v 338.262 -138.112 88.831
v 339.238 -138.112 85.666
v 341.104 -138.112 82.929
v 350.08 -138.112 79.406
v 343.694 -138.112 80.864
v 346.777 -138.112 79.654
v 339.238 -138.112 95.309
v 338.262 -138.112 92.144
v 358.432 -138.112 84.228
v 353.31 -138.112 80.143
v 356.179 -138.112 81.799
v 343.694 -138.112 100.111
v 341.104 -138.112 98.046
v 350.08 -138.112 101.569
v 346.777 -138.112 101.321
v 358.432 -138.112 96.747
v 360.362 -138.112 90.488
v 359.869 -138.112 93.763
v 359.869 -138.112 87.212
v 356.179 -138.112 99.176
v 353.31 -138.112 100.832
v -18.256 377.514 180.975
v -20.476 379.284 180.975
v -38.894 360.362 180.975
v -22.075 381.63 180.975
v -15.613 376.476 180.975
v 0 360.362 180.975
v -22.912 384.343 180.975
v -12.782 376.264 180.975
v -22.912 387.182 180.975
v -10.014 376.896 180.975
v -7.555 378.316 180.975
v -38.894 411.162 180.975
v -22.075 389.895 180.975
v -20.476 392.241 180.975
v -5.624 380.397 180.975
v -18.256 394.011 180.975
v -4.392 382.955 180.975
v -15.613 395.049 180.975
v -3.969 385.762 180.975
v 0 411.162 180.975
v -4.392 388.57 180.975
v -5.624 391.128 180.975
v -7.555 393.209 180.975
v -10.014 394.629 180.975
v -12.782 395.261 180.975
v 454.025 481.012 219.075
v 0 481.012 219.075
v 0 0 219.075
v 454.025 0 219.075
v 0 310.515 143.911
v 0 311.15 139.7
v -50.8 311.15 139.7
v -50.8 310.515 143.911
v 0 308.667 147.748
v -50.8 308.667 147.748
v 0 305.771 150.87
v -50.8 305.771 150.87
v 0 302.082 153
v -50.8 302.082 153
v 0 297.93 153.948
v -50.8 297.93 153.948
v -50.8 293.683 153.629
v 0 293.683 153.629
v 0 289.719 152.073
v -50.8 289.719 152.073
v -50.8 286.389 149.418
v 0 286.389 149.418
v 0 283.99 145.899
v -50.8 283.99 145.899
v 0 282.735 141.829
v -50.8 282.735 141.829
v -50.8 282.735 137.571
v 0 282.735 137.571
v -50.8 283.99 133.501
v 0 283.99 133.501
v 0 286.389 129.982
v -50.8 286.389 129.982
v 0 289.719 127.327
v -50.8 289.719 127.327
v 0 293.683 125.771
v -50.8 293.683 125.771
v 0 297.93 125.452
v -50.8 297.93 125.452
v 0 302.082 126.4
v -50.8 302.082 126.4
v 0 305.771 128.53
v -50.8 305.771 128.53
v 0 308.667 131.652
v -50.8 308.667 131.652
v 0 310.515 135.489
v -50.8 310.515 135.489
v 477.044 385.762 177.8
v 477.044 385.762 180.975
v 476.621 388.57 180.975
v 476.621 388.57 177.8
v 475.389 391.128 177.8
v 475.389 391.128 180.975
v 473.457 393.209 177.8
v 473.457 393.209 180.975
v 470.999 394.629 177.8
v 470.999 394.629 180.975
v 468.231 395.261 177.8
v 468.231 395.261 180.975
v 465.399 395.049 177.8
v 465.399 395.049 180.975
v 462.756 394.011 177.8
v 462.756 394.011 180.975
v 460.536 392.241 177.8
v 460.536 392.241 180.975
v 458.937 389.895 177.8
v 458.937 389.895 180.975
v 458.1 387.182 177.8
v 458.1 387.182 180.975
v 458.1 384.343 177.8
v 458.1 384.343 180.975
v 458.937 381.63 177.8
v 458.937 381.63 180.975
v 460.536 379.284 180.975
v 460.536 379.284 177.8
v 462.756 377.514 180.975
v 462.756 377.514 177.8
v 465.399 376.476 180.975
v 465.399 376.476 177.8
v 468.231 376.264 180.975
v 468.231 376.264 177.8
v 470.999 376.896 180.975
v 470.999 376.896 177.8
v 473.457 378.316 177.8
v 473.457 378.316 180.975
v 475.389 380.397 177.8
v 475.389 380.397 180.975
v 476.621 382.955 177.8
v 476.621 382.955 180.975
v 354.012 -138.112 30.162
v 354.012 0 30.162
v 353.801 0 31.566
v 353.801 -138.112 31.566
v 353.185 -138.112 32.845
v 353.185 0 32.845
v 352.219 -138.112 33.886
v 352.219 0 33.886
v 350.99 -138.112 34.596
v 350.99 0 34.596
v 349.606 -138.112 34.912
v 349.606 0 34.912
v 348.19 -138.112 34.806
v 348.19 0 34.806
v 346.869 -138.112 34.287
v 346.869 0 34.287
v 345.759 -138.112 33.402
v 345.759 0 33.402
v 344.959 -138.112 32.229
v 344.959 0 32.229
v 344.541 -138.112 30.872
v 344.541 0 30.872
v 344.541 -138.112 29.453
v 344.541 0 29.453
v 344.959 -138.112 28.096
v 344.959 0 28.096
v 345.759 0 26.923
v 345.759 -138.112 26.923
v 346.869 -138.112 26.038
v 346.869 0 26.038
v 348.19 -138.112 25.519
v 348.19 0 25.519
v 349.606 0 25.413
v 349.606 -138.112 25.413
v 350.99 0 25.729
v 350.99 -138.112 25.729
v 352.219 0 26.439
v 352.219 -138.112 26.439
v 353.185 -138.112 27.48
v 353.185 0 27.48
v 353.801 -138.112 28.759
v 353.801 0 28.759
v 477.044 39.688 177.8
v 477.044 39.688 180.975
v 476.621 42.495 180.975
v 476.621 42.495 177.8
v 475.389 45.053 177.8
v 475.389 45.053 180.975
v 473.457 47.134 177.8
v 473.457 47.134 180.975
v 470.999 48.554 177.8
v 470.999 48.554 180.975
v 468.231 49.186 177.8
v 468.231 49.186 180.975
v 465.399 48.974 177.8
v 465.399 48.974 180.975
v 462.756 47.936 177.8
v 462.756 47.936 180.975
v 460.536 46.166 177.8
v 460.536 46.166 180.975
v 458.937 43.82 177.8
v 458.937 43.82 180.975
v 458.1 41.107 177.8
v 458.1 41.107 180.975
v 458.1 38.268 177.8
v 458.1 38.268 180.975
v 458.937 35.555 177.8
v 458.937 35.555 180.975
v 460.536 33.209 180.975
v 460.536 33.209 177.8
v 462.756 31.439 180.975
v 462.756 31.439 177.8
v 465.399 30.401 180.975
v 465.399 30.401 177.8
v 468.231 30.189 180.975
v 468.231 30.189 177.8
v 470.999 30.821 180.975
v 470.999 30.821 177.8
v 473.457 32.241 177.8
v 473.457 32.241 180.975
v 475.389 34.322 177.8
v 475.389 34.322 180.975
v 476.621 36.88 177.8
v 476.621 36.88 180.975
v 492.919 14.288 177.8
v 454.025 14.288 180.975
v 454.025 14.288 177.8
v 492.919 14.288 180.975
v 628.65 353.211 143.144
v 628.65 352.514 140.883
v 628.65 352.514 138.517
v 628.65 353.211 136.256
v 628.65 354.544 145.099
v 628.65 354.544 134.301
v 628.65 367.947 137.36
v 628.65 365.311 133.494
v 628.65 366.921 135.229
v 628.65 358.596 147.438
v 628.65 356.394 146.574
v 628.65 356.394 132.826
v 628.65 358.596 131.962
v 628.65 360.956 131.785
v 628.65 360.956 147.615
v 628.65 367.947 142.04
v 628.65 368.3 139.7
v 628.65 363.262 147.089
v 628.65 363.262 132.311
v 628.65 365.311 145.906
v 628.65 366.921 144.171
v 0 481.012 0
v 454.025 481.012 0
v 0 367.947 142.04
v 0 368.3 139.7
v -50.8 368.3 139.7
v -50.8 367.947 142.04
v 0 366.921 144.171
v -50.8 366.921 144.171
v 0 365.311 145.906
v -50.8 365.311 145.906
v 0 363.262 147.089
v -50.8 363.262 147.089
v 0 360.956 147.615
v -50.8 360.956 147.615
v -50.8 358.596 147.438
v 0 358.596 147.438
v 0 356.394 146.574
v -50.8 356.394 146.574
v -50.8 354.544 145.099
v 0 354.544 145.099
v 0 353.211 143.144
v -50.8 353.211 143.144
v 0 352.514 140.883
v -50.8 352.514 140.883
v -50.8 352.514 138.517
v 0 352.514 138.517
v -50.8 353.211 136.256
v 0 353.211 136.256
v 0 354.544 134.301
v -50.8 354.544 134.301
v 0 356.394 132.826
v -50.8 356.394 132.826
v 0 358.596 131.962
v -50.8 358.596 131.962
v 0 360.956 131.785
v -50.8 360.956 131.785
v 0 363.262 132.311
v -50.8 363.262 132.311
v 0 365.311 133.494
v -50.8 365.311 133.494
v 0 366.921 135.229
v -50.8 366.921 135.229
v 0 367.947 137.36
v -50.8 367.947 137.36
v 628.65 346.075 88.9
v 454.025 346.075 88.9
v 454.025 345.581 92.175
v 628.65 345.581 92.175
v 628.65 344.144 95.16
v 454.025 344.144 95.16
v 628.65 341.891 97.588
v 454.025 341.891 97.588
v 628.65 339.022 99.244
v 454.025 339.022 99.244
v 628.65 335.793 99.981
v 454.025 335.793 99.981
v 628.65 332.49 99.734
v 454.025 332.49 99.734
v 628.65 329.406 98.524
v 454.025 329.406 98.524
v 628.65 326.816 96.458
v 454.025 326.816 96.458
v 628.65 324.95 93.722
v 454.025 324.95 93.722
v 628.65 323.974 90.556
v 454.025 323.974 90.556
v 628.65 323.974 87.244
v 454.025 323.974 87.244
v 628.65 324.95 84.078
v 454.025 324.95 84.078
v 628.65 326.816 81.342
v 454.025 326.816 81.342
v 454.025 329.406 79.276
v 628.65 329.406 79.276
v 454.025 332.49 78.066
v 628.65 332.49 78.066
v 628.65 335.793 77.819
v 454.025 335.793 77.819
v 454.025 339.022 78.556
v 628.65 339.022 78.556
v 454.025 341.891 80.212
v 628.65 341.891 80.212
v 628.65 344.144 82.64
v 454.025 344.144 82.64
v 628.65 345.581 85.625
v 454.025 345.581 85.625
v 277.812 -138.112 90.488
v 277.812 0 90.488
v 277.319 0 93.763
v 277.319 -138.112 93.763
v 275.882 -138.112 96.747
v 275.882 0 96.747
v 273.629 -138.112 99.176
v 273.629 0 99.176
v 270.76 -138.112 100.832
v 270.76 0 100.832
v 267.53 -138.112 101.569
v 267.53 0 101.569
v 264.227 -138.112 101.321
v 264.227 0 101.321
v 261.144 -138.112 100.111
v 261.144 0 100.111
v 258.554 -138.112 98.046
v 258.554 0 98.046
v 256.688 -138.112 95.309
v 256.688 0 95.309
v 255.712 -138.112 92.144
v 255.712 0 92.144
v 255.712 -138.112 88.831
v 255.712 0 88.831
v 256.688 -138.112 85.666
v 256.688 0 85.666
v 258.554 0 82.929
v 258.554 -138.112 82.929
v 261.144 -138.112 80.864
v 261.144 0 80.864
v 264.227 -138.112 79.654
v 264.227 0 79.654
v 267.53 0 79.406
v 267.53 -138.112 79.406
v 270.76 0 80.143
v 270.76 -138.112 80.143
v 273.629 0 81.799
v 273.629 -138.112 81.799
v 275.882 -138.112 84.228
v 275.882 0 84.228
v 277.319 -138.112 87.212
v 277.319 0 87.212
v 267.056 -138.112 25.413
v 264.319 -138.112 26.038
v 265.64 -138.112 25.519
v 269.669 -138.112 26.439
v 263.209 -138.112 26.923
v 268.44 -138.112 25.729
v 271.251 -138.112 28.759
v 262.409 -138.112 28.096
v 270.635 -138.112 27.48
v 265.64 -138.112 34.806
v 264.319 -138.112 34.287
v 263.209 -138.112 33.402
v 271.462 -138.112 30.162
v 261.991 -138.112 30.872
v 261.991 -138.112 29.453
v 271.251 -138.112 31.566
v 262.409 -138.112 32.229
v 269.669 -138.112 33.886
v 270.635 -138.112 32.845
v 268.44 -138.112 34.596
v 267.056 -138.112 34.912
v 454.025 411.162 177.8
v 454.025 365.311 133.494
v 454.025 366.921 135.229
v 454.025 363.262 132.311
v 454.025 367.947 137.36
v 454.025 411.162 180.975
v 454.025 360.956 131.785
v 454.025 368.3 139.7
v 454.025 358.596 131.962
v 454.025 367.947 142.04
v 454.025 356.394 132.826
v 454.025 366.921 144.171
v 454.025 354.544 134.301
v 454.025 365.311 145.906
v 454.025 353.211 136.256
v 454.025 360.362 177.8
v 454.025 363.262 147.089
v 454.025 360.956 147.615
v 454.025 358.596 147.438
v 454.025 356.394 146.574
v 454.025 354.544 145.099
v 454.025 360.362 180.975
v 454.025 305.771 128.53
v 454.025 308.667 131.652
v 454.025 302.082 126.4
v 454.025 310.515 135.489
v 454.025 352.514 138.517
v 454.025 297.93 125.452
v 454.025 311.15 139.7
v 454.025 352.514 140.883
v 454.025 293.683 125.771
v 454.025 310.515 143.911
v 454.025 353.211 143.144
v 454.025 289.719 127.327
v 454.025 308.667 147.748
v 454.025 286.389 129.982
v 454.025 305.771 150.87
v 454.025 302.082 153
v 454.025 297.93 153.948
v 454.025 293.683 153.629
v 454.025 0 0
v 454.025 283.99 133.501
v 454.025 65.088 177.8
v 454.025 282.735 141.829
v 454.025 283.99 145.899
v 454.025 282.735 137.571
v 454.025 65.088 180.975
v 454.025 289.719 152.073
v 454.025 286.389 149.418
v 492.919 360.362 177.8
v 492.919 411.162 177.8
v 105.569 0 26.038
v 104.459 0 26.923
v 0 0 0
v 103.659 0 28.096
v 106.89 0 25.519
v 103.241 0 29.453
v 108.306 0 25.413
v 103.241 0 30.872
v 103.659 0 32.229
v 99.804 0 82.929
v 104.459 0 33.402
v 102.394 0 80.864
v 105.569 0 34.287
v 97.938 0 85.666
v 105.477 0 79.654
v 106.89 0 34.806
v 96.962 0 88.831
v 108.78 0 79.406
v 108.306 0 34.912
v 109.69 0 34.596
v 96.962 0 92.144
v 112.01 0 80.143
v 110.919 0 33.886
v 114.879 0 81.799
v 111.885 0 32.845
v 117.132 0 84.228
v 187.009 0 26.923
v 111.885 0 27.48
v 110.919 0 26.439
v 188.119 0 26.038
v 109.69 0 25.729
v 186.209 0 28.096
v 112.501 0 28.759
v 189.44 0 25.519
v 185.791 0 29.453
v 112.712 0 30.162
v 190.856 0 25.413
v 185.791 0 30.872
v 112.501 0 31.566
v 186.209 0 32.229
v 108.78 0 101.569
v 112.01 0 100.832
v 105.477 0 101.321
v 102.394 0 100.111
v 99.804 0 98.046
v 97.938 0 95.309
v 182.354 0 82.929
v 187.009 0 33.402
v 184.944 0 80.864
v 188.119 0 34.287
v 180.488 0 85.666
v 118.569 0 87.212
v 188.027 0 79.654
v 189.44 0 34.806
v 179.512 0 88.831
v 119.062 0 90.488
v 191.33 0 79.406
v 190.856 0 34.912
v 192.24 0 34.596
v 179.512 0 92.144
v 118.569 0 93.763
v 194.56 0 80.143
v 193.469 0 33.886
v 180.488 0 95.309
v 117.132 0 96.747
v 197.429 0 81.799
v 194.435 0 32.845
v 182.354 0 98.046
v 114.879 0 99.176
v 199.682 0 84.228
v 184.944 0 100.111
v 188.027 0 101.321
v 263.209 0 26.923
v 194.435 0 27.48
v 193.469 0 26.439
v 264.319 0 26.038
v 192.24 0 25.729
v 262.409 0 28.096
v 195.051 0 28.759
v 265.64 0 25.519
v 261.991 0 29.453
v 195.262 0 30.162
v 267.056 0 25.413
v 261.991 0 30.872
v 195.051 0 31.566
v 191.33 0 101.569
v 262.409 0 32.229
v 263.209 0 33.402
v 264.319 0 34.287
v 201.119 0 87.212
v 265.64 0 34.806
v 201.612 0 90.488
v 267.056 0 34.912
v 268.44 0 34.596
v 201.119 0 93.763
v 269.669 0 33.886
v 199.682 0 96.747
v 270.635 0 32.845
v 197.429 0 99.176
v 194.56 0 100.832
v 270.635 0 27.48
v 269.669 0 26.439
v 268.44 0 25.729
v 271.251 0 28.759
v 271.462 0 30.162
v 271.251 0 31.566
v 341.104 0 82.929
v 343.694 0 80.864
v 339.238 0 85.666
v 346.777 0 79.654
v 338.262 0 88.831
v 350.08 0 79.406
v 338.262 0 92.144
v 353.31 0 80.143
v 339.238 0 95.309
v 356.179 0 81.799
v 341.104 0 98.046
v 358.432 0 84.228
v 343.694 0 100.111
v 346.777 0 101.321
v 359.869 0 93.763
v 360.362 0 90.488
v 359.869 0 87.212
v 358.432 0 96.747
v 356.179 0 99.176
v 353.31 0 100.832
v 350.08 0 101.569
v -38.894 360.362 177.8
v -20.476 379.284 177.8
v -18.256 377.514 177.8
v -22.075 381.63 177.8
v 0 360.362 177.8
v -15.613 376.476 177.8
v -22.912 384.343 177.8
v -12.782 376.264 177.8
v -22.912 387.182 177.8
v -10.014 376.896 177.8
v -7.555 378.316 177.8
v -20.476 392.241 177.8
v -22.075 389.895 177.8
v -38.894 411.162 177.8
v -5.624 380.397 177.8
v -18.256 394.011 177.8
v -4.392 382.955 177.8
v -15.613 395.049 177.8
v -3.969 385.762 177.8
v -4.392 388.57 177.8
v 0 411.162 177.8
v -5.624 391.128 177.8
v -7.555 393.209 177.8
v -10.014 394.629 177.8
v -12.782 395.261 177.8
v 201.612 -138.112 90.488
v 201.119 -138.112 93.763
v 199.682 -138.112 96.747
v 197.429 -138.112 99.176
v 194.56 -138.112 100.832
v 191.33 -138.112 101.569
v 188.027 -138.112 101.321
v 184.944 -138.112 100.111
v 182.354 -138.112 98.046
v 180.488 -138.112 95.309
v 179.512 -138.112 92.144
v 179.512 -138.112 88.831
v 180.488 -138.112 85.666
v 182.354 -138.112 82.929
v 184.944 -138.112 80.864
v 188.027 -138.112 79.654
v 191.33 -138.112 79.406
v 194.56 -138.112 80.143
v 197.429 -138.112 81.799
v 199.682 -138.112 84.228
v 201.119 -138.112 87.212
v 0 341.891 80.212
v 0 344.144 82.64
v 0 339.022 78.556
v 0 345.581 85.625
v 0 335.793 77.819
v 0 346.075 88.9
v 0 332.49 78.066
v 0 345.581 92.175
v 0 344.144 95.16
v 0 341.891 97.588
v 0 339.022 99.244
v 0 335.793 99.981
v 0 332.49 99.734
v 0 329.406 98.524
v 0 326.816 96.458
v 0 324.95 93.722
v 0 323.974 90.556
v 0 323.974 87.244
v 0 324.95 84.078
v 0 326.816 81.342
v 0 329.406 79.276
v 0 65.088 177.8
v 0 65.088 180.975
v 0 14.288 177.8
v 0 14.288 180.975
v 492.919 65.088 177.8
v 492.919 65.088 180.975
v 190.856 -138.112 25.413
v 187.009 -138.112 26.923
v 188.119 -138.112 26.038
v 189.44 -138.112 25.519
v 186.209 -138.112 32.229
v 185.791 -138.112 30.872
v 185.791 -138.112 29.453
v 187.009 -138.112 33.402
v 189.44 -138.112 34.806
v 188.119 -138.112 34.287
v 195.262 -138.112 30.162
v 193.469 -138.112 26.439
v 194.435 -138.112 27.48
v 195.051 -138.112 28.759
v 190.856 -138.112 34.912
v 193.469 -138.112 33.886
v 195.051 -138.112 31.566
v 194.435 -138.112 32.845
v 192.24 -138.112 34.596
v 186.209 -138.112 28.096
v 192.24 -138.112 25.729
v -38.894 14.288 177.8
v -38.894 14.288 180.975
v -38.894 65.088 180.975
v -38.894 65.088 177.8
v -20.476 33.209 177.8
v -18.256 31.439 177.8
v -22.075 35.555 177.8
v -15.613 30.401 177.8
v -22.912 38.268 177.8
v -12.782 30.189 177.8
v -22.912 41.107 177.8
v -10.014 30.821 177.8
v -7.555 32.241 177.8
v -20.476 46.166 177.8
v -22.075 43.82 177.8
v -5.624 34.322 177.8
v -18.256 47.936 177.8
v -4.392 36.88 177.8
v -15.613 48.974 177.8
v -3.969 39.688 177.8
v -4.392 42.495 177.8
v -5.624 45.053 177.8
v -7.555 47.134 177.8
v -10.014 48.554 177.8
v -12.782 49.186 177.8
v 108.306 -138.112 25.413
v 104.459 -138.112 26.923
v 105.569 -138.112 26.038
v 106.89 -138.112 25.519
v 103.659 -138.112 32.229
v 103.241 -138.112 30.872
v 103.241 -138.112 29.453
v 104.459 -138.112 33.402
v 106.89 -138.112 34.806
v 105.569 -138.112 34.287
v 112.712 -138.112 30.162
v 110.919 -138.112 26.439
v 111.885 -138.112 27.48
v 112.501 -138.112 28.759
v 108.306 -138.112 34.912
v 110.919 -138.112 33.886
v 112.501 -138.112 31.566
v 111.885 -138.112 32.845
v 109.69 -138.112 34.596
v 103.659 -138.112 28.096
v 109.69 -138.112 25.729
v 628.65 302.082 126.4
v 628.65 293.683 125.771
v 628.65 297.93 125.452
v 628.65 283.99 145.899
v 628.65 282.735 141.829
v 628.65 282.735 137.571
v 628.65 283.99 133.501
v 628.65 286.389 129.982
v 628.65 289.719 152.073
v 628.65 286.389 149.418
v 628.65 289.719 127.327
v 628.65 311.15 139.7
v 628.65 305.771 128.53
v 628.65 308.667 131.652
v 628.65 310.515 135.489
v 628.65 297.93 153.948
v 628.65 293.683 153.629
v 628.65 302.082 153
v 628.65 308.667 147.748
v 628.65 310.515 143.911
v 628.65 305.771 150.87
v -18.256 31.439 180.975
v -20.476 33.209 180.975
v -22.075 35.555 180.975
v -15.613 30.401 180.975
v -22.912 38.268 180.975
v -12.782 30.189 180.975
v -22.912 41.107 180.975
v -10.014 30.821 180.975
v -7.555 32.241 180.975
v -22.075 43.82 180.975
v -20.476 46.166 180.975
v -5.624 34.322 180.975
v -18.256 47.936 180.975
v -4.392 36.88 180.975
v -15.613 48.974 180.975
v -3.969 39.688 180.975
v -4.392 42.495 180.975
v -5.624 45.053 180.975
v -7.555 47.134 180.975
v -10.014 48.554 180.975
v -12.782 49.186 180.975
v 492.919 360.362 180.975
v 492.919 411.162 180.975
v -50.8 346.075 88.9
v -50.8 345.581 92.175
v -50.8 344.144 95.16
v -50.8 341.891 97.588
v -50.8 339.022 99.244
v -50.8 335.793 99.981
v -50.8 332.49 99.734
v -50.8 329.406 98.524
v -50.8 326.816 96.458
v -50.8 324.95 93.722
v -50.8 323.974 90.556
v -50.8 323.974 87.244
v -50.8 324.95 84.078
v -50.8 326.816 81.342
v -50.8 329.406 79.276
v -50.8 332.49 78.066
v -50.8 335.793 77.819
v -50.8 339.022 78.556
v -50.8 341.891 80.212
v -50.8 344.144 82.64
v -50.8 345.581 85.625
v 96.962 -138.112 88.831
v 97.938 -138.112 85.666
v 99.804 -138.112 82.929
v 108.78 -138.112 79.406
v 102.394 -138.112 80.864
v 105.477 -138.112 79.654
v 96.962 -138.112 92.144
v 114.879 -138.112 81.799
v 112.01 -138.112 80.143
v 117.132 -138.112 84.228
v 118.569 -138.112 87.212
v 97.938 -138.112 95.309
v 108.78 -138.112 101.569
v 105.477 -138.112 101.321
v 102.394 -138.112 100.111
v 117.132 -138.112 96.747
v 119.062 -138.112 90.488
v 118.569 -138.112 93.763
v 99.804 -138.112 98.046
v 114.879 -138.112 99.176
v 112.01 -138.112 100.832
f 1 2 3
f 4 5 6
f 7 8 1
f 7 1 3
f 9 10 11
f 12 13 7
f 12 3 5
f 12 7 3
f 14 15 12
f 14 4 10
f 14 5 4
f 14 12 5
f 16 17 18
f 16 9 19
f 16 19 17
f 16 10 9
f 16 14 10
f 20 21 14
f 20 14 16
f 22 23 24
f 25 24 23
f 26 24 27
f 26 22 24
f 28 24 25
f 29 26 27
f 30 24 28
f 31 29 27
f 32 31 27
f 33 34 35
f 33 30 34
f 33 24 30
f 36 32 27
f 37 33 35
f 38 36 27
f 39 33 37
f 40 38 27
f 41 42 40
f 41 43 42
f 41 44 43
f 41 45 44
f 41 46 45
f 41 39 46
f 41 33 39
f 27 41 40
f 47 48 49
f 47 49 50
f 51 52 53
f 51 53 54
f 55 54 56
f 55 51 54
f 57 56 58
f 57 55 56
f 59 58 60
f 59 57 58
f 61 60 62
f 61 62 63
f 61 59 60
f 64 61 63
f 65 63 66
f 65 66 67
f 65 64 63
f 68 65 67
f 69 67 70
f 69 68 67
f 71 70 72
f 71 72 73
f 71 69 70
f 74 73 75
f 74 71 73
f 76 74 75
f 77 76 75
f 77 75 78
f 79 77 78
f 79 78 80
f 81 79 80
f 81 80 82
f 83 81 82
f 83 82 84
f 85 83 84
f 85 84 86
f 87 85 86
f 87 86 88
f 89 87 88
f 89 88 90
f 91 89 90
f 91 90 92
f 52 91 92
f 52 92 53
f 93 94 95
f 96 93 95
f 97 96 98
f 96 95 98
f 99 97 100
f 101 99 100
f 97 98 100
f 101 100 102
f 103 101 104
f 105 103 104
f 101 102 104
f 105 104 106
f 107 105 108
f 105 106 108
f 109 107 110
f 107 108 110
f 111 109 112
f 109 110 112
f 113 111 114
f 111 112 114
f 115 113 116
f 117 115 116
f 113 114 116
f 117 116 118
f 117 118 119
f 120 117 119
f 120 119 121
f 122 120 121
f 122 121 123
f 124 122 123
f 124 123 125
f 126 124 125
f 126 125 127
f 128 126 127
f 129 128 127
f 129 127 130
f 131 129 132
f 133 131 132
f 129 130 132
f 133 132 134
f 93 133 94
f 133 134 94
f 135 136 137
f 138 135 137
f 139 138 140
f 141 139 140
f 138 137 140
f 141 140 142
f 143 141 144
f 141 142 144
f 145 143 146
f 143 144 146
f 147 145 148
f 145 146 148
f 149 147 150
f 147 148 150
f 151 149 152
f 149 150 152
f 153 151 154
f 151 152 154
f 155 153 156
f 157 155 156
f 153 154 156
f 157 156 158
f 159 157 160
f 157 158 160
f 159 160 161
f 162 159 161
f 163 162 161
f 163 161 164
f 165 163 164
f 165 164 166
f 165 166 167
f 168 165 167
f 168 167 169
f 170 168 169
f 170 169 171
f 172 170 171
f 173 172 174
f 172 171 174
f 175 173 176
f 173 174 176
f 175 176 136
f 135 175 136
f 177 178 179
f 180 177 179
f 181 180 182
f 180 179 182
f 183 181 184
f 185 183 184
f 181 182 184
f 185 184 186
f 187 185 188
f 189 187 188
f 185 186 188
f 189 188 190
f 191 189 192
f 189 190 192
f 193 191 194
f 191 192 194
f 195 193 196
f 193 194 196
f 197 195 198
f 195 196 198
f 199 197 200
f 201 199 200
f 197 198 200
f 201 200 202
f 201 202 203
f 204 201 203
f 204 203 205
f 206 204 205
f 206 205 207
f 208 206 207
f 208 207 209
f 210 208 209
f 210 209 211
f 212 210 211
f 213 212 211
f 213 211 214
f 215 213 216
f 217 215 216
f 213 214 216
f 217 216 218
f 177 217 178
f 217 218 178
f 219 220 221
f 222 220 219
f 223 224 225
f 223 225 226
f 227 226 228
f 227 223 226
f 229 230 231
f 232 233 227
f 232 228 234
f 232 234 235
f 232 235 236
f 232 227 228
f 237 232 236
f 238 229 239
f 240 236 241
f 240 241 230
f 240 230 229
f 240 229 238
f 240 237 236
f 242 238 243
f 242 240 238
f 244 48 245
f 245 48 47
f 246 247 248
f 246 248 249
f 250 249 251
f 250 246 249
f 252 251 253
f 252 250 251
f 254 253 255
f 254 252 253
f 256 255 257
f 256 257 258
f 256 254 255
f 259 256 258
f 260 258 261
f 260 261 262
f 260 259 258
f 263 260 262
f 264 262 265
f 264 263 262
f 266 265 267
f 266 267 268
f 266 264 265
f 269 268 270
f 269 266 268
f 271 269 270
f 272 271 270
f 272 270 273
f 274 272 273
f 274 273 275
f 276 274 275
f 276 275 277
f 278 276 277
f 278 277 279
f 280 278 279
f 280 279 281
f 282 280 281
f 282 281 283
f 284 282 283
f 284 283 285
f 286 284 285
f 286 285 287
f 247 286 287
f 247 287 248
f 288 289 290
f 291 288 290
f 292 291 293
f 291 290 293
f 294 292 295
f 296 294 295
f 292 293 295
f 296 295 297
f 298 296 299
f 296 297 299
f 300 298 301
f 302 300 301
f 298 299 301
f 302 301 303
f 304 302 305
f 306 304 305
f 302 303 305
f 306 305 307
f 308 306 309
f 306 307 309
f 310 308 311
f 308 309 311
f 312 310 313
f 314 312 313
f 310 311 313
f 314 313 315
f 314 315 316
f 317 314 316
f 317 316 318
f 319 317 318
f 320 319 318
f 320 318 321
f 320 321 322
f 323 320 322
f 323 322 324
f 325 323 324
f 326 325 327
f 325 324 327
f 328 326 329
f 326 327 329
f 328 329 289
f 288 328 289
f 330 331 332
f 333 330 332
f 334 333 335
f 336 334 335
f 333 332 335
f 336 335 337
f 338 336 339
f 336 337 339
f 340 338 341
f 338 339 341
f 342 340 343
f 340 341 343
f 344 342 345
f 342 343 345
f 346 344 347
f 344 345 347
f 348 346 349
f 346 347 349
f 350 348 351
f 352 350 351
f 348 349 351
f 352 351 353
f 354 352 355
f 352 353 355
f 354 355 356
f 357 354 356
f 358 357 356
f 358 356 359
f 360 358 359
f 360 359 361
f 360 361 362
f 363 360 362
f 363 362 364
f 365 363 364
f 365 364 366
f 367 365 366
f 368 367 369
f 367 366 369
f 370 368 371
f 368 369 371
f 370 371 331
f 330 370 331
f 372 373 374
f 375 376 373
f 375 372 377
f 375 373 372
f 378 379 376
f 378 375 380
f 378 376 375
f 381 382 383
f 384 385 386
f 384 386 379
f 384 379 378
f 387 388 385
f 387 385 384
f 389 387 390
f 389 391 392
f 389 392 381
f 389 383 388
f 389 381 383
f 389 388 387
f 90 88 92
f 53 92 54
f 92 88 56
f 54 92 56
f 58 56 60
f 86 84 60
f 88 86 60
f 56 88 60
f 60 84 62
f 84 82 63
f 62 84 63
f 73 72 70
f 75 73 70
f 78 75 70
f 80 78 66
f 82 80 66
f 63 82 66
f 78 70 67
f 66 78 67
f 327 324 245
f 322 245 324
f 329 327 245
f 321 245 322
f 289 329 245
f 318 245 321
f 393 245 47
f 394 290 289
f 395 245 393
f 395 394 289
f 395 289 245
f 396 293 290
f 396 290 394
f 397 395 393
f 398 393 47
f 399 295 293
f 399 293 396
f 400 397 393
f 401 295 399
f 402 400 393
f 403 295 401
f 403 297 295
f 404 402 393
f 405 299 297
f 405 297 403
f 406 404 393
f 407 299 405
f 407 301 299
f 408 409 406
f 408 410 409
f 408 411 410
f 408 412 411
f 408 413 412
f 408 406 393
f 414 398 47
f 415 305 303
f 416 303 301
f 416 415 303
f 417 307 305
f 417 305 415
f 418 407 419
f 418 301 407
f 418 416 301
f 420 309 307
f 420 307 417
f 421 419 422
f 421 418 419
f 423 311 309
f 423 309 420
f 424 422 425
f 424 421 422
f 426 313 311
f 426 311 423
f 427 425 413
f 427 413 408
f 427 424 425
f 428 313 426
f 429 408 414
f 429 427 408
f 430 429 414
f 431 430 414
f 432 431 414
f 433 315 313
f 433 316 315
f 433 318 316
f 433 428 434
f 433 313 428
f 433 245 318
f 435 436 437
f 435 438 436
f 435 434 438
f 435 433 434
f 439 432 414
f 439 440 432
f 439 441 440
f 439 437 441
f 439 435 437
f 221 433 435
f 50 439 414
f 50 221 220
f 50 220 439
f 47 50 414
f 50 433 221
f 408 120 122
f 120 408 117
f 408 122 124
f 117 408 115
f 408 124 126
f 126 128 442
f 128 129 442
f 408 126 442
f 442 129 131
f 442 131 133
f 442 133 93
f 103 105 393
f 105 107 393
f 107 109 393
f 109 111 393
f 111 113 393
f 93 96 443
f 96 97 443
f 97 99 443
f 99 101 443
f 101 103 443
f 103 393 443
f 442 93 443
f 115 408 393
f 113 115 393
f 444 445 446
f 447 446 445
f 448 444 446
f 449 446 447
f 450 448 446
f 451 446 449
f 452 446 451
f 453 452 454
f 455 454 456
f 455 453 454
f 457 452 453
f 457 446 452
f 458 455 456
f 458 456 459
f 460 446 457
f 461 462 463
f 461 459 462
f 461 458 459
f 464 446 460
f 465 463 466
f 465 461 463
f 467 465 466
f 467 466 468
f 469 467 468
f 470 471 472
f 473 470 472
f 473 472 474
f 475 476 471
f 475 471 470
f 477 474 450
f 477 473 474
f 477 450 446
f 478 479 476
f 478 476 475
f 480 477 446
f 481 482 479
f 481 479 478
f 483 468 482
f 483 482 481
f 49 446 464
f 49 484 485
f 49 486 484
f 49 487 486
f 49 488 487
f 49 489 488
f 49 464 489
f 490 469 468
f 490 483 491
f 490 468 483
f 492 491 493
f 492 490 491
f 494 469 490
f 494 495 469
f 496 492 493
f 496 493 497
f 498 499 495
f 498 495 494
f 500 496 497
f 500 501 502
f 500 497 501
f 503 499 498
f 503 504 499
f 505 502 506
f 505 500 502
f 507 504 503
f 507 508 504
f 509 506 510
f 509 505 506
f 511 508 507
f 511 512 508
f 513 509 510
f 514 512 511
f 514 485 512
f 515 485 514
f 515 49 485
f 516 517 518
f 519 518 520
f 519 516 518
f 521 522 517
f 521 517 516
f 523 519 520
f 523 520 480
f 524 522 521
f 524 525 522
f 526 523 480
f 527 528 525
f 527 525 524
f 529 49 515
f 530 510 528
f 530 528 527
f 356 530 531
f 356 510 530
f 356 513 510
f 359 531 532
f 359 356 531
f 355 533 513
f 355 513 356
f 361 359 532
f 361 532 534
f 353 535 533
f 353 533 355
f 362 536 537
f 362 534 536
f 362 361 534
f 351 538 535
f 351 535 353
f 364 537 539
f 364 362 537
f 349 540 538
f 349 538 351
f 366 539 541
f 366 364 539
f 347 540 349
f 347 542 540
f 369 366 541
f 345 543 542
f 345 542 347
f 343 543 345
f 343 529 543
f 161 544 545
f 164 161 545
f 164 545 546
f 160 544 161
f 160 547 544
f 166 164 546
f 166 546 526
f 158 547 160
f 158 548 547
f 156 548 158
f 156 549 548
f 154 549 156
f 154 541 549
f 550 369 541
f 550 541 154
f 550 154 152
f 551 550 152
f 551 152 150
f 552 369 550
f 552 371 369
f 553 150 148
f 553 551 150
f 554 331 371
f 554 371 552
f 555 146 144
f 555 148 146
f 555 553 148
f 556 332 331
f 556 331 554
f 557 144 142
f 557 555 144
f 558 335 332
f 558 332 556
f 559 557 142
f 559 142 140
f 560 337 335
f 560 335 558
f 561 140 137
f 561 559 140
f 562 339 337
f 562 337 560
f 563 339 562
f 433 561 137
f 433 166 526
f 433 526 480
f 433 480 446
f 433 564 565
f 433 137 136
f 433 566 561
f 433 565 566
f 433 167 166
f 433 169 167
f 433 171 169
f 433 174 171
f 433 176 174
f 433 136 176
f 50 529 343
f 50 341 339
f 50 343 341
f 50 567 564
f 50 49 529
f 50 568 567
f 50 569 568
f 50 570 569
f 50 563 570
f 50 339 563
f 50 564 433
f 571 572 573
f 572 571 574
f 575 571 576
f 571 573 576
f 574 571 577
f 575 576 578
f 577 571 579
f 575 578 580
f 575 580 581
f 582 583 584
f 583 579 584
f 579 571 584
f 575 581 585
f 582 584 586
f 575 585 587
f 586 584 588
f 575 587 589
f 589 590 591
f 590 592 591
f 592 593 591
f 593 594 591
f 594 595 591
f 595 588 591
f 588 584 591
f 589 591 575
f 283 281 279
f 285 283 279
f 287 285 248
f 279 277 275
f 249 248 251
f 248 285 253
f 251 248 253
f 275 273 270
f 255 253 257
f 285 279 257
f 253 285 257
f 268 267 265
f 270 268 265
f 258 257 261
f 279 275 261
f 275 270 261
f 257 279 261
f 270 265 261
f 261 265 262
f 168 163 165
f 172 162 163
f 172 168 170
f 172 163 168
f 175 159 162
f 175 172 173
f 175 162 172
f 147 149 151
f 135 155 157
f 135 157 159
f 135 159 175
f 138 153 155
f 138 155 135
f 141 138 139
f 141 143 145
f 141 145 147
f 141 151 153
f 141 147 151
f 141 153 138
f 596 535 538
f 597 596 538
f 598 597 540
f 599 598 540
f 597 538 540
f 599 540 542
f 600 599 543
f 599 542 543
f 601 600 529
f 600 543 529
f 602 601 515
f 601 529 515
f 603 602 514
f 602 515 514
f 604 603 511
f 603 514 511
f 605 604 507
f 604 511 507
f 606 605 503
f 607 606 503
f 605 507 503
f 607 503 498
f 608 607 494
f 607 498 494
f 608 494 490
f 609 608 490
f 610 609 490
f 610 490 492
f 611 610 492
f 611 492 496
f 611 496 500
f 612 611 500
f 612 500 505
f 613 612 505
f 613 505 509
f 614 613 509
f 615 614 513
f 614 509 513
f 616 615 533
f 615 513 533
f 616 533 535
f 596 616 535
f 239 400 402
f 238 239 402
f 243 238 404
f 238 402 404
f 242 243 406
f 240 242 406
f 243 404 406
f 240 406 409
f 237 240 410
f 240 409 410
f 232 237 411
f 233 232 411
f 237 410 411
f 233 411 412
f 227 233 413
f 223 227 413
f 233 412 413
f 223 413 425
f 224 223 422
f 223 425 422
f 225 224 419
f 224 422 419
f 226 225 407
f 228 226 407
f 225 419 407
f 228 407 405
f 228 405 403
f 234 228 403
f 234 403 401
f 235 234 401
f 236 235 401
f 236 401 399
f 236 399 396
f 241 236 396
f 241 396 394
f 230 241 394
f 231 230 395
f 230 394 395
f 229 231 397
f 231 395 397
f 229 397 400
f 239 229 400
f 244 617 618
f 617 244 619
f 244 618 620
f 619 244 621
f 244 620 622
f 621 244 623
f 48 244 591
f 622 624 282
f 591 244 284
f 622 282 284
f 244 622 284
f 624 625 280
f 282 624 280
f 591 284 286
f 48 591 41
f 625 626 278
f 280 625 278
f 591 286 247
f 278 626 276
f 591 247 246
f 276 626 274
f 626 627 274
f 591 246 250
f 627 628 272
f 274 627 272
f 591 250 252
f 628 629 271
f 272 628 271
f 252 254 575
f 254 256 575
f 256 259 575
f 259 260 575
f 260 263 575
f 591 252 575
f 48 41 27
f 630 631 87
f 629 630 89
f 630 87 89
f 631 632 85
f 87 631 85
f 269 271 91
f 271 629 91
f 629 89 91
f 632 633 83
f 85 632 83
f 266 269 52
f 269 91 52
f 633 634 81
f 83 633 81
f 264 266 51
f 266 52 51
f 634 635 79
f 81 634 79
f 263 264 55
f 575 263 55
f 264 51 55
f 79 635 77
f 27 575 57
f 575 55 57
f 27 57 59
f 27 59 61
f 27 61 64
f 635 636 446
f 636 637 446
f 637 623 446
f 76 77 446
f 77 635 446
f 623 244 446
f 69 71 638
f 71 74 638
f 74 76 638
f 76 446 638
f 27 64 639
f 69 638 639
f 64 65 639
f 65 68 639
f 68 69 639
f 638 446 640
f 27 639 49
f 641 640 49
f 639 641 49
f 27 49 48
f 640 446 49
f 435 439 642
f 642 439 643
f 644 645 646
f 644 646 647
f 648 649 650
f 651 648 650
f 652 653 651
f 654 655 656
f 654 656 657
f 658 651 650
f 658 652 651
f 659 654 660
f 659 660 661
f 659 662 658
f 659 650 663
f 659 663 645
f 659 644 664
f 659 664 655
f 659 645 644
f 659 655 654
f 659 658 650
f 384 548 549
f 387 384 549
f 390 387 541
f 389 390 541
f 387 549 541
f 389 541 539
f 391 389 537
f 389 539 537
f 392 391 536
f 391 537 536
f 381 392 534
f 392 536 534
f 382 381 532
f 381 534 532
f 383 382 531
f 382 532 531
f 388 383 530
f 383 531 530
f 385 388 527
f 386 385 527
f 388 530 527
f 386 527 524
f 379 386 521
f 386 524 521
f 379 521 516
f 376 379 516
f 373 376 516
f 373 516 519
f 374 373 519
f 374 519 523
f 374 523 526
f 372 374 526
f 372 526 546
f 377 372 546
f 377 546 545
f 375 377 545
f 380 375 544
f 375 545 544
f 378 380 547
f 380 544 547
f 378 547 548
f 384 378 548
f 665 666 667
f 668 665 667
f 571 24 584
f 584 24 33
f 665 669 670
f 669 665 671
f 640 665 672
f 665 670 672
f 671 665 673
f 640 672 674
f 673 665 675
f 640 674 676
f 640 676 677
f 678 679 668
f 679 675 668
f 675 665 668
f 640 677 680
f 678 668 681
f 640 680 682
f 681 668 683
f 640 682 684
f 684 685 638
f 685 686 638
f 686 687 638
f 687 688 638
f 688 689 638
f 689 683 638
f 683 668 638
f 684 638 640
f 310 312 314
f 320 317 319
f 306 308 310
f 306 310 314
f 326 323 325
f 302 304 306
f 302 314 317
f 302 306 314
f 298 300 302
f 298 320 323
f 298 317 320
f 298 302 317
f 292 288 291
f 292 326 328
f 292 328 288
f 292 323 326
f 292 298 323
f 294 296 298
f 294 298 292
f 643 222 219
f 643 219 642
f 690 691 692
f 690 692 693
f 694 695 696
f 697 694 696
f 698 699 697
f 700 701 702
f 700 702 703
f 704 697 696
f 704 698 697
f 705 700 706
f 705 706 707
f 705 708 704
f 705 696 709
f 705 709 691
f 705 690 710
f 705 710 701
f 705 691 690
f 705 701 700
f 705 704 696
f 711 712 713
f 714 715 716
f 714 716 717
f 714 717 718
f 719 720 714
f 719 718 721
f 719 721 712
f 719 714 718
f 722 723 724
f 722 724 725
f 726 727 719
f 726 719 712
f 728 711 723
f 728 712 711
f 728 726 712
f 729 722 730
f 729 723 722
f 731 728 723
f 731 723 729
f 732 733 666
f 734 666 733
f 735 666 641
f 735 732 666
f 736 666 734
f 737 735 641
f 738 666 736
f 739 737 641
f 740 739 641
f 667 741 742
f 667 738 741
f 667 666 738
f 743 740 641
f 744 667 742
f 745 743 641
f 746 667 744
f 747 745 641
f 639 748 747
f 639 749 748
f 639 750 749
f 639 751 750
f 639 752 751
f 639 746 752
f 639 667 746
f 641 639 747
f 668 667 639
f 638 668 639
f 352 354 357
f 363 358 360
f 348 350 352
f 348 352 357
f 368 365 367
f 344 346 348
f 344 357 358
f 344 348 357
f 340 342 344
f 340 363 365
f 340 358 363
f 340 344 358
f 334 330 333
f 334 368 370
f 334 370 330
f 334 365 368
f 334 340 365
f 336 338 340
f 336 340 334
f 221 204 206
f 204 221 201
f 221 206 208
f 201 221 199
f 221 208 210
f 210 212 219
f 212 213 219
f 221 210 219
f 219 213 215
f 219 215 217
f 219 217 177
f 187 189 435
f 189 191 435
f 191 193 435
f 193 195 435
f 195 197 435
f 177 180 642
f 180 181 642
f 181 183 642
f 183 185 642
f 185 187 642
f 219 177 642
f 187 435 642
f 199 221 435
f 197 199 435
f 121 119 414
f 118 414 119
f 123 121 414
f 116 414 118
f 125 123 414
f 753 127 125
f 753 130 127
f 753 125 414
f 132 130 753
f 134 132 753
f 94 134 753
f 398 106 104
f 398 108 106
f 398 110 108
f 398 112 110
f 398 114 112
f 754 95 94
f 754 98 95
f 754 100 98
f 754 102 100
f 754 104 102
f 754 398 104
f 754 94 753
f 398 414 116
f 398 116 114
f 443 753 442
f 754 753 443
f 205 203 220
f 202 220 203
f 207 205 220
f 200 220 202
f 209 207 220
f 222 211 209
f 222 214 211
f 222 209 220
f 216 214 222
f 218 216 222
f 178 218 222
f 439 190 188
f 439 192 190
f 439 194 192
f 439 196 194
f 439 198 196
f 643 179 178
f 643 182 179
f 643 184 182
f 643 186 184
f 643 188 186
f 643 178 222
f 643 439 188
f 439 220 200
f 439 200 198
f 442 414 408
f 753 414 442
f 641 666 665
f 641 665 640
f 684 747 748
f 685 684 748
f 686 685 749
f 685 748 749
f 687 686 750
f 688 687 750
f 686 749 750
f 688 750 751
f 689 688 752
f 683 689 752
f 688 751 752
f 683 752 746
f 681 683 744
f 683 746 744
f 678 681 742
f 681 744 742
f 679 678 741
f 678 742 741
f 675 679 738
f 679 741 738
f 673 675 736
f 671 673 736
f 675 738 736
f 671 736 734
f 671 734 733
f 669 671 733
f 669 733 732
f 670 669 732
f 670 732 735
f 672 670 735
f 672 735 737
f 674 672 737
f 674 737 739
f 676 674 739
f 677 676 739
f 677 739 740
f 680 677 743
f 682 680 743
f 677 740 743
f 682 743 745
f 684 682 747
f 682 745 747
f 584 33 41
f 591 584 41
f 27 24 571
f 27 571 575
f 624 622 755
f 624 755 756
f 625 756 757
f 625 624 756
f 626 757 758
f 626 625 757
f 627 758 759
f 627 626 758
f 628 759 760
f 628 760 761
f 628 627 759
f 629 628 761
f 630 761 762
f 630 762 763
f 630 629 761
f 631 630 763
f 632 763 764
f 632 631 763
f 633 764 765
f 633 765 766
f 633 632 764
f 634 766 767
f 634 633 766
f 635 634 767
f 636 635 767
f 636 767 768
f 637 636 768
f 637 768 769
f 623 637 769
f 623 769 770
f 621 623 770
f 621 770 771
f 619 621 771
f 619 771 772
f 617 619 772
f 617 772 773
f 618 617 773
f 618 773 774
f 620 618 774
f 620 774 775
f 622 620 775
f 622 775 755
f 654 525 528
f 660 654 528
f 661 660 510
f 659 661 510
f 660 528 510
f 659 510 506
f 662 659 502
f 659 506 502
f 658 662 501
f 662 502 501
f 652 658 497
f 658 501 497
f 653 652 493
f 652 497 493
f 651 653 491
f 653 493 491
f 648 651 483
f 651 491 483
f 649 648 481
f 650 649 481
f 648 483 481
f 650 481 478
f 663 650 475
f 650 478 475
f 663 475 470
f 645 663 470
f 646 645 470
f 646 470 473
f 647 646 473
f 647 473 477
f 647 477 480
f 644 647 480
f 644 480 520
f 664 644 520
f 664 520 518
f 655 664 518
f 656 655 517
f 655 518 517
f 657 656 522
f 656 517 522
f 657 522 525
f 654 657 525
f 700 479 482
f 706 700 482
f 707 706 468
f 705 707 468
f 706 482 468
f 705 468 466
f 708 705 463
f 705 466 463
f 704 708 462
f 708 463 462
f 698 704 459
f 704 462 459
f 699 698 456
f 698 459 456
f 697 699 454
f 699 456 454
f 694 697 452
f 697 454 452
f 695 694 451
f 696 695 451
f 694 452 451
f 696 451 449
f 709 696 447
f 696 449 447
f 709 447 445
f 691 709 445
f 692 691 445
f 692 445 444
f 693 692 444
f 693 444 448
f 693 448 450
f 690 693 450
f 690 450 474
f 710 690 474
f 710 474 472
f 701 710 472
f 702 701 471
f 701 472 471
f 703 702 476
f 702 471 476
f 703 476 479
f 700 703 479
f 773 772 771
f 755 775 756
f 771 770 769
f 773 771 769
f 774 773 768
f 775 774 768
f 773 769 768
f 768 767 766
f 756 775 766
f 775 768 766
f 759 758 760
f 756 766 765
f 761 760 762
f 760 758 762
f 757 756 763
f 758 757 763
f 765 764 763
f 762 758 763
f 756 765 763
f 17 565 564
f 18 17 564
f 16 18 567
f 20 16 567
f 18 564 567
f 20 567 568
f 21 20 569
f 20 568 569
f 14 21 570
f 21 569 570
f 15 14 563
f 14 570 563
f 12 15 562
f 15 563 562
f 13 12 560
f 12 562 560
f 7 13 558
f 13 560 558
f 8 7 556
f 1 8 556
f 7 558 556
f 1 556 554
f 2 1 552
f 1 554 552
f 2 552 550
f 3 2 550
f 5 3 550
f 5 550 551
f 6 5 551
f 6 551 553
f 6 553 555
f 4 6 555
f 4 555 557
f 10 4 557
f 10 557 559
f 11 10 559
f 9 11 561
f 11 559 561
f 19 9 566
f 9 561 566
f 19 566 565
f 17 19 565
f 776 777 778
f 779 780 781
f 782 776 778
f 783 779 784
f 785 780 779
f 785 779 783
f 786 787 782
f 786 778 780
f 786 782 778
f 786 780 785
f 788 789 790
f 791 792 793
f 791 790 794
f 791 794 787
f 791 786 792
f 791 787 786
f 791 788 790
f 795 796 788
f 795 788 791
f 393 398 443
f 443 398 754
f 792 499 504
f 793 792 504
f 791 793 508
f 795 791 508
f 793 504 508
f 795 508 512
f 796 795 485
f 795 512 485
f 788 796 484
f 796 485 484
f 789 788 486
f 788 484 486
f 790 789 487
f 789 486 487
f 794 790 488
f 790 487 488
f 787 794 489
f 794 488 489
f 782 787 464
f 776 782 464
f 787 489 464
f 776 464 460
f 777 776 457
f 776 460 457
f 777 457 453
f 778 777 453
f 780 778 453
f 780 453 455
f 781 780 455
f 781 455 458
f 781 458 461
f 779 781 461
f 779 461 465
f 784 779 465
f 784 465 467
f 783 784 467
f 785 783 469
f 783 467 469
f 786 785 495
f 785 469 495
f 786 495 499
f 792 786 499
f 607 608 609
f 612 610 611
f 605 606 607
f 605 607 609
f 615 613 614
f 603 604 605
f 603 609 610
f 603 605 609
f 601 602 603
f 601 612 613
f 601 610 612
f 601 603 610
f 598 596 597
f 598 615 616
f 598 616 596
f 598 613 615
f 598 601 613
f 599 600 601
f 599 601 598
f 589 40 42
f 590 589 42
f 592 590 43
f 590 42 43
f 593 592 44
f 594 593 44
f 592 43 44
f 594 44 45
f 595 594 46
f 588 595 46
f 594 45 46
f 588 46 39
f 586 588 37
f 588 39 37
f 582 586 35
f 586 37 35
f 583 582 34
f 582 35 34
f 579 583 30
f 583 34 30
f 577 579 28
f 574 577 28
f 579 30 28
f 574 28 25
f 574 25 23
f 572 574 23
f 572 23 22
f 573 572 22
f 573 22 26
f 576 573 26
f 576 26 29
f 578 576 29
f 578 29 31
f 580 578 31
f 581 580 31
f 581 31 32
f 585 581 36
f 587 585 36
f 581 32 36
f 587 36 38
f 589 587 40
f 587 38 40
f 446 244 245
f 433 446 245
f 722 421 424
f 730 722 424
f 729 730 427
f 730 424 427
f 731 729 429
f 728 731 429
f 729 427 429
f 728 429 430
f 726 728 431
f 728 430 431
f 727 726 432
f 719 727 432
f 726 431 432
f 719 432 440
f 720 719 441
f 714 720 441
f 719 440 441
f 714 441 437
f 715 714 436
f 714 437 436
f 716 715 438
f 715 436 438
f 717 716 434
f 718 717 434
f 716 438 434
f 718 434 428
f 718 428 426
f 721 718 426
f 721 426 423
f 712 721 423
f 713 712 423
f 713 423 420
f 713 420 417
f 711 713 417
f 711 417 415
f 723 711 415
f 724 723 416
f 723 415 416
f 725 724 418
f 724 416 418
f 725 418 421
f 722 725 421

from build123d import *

# Parameters (mm, degrees)
F0_W          = 454.025
F0_H          = 219.075
F1_DEPTH      = 481.0125
F2_R          = 11.1125
F2_R_2        = 4.7625
F3_DEPTH      = 138.1125
F4_R          = 14.2875
F4_R_2        = 7.9375
F4_R_3        = 11.1125
F5_DEPTH      = 174.625
F5_DEPTH_BACK = 628.65
F7_W          = 38.89375
F7_H          = 50.8
F7_R          = 9.525
F8_DEPTH      = 3.175
F9_W          = 152.4
F9_H          = 219.075
F10_DEPTH     = 481.0135


with BuildPart() as f1:
    # F0 (on Front) → F1 (new body)
    with BuildSketch(Plane.XZ):
        with Locations((227.0125, 109.5375)):
            Rectangle(F0_W, F0_H)
    extrude(amount=-F1_DEPTH)

    # F2 (on Front) → F3 (join)
    with BuildSketch(Plane.XZ):
        with Locations((107.95, 90.4875)):
            Circle(F2_R)
        with Locations((107.95, 30.1625)):
            Circle(F2_R_2)
        with Locations((349.25, 90.4875)):
            Circle(F2_R)
        with Locations((349.25, 30.1625)):
            Circle(F2_R_2)
        with Locations((190.5, 90.4875)):
            Circle(F2_R)
        with Locations((266.7, 90.4875)):
            Circle(F2_R)
        with Locations((190.5, 30.1625)):
            Circle(F2_R_2)
        with Locations((266.7, 30.1625)):
            Circle(F2_R_2)
    extrude(amount=F3_DEPTH)

    # F4 (on face) → F5 (join, two sides)
    with BuildSketch(Plane.YZ.offset(454.025)) as f5_sk:
        with Locations((296.8625, 139.7)):
            Circle(F4_R)
        with Locations((360.3625, 139.7)):
            Circle(F4_R_2)
        with Locations((334.9625, 88.9)):
            Circle(F4_R_3)
    extrude(amount=F5_DEPTH)
    extrude(f5_sk.sketch, amount=-F5_DEPTH_BACK)

    # F7 (on offset) → F8 (join)
    with BuildSketch(Plane.XY.offset(180.975)):
        with Locations((-19.446875, 385.7625)):
            Rectangle(F7_W, F7_H)
        with Locations((-13.49375, 385.7625)):
            Circle(F7_R, mode=Mode.SUBTRACT)
        with Locations((-19.446875, 39.6875)):
            Rectangle(F7_W, F7_H)
        with Locations((-13.49375, 39.6875)):
            Circle(F7_R, mode=Mode.SUBTRACT)
        with Locations((473.471875, 385.7625)):
            Rectangle(F7_W, F7_H)
        with Locations((467.51875, 385.7625)):
            Circle(F7_R, mode=Mode.SUBTRACT)
        with Locations((473.471875, 39.6875)):
            Rectangle(F7_W, F7_H)
        with Locations((467.51875, 39.6875)):
            Circle(F7_R, mode=Mode.SUBTRACT)
    extrude(amount=-F8_DEPTH)

    # F9 (on face) → F10 (cut, through all)
    with BuildSketch(Plane.XZ):
        with Locations((-127, 109.5375)):
            Rectangle(F9_W, F9_H)
    extrude(amount=-F10_DEPTH, mode=Mode.SUBTRACT)


solid = f1.part
